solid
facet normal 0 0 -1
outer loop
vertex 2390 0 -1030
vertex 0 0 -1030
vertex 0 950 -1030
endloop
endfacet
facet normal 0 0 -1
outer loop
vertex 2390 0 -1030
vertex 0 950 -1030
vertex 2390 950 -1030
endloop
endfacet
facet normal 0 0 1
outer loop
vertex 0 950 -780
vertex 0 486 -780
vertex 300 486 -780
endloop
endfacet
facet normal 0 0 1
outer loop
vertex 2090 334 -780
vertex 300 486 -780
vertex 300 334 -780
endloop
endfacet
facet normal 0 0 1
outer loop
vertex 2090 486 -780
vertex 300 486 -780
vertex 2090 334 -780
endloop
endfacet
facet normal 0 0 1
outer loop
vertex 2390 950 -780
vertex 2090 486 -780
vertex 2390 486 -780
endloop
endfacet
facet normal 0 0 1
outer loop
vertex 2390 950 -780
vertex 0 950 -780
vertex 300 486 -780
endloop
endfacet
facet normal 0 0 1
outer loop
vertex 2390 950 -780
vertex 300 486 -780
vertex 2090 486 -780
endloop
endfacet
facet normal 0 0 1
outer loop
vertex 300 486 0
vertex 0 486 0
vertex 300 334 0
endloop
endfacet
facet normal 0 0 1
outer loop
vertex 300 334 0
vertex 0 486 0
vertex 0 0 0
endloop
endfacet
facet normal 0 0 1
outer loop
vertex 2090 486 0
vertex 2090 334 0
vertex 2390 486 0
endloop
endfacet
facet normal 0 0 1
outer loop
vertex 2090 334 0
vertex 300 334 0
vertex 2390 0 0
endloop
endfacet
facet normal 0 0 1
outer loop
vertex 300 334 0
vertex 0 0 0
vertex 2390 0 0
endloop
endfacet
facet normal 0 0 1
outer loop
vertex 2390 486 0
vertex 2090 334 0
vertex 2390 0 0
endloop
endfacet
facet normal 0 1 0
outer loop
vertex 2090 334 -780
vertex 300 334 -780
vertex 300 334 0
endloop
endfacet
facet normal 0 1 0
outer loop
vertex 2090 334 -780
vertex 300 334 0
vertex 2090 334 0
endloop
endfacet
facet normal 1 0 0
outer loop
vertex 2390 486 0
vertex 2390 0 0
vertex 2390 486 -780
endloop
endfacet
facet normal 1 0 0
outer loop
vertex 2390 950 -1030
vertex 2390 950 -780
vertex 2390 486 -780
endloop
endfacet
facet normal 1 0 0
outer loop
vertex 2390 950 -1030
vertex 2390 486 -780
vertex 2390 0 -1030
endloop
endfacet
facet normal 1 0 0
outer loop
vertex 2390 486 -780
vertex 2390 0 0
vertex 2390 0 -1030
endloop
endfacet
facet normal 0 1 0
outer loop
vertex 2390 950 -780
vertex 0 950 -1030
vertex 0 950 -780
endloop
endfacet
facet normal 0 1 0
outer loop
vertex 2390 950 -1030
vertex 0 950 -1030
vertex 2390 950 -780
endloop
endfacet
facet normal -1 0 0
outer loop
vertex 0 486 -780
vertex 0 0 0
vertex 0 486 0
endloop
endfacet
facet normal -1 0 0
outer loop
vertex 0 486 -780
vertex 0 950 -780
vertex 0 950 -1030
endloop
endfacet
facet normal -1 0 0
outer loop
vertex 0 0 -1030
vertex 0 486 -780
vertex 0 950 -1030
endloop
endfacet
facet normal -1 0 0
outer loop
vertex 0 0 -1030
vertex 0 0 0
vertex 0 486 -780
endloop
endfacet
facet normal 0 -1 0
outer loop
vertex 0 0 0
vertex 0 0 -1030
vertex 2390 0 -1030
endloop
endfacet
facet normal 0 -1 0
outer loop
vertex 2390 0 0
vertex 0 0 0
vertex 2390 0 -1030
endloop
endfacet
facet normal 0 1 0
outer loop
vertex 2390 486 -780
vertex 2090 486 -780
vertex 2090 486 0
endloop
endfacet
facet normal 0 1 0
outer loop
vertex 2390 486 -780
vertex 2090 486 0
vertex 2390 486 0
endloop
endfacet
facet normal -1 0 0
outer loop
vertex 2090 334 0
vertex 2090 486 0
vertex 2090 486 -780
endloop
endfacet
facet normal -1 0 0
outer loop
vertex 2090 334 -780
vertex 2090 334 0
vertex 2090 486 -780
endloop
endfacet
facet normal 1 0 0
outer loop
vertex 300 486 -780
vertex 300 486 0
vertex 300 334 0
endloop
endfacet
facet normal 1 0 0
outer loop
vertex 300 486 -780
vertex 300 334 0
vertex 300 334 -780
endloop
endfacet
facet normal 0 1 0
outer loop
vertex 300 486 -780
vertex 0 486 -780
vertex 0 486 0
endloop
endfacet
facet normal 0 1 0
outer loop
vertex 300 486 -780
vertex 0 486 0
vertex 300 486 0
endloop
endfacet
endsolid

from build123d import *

# Parameters (mm, degrees)
SKETCH_1_W          = 2390
SKETCH_1_H          = 1030
EXTRUDE_1_DEPTH     = 950
SKETCH_2_W          = 1790
SKETCH_2_H          = 780
CUT_EXTRUDE_1_DEPTH = 616
SKETCH_3_W          = 300
SKETCH_3_H          = 780
CUT_EXTRUDE_2_DEPTH = 464


with BuildPart() as part:
    # Эскиз1 → Бобышка-Вытянуть1 (new body)
    with BuildSketch(Plane(origin=(0, 0, 0), x_dir=(1, 0, 0), z_dir=(0, 1, 0))):
        with Locations((1195, 515)):
            Rectangle(SKETCH_1_W, SKETCH_1_H)
    extrude(amount=EXTRUDE_1_DEPTH)

    # Эскиз2 → Вырез-Вытянуть1 (cut)
    with BuildSketch(Plane(origin=(0, 950, 0), x_dir=(1, 0, 0), z_dir=(0, 1, 0))):
        with Locations((1195, 390)):
            Rectangle(SKETCH_2_W, SKETCH_2_H)
    extrude(amount=-CUT_EXTRUDE_1_DEPTH, mode=Mode.SUBTRACT)

    # Эскиз3 → Вырез-Вытянуть2 (cut)
    with BuildSketch(Plane(origin=(0, 950, 0), x_dir=(1, 0, 0), z_dir=(0, 1, 0))):
        with Locations((150, 390)):
            Rectangle(SKETCH_3_W, SKETCH_3_H)
        with Locations((2240, 390)):
            Rectangle(SKETCH_3_W, SKETCH_3_H)
    extrude(amount=-CUT_EXTRUDE_2_DEPTH, mode=Mode.SUBTRACT)


solid = part.part
